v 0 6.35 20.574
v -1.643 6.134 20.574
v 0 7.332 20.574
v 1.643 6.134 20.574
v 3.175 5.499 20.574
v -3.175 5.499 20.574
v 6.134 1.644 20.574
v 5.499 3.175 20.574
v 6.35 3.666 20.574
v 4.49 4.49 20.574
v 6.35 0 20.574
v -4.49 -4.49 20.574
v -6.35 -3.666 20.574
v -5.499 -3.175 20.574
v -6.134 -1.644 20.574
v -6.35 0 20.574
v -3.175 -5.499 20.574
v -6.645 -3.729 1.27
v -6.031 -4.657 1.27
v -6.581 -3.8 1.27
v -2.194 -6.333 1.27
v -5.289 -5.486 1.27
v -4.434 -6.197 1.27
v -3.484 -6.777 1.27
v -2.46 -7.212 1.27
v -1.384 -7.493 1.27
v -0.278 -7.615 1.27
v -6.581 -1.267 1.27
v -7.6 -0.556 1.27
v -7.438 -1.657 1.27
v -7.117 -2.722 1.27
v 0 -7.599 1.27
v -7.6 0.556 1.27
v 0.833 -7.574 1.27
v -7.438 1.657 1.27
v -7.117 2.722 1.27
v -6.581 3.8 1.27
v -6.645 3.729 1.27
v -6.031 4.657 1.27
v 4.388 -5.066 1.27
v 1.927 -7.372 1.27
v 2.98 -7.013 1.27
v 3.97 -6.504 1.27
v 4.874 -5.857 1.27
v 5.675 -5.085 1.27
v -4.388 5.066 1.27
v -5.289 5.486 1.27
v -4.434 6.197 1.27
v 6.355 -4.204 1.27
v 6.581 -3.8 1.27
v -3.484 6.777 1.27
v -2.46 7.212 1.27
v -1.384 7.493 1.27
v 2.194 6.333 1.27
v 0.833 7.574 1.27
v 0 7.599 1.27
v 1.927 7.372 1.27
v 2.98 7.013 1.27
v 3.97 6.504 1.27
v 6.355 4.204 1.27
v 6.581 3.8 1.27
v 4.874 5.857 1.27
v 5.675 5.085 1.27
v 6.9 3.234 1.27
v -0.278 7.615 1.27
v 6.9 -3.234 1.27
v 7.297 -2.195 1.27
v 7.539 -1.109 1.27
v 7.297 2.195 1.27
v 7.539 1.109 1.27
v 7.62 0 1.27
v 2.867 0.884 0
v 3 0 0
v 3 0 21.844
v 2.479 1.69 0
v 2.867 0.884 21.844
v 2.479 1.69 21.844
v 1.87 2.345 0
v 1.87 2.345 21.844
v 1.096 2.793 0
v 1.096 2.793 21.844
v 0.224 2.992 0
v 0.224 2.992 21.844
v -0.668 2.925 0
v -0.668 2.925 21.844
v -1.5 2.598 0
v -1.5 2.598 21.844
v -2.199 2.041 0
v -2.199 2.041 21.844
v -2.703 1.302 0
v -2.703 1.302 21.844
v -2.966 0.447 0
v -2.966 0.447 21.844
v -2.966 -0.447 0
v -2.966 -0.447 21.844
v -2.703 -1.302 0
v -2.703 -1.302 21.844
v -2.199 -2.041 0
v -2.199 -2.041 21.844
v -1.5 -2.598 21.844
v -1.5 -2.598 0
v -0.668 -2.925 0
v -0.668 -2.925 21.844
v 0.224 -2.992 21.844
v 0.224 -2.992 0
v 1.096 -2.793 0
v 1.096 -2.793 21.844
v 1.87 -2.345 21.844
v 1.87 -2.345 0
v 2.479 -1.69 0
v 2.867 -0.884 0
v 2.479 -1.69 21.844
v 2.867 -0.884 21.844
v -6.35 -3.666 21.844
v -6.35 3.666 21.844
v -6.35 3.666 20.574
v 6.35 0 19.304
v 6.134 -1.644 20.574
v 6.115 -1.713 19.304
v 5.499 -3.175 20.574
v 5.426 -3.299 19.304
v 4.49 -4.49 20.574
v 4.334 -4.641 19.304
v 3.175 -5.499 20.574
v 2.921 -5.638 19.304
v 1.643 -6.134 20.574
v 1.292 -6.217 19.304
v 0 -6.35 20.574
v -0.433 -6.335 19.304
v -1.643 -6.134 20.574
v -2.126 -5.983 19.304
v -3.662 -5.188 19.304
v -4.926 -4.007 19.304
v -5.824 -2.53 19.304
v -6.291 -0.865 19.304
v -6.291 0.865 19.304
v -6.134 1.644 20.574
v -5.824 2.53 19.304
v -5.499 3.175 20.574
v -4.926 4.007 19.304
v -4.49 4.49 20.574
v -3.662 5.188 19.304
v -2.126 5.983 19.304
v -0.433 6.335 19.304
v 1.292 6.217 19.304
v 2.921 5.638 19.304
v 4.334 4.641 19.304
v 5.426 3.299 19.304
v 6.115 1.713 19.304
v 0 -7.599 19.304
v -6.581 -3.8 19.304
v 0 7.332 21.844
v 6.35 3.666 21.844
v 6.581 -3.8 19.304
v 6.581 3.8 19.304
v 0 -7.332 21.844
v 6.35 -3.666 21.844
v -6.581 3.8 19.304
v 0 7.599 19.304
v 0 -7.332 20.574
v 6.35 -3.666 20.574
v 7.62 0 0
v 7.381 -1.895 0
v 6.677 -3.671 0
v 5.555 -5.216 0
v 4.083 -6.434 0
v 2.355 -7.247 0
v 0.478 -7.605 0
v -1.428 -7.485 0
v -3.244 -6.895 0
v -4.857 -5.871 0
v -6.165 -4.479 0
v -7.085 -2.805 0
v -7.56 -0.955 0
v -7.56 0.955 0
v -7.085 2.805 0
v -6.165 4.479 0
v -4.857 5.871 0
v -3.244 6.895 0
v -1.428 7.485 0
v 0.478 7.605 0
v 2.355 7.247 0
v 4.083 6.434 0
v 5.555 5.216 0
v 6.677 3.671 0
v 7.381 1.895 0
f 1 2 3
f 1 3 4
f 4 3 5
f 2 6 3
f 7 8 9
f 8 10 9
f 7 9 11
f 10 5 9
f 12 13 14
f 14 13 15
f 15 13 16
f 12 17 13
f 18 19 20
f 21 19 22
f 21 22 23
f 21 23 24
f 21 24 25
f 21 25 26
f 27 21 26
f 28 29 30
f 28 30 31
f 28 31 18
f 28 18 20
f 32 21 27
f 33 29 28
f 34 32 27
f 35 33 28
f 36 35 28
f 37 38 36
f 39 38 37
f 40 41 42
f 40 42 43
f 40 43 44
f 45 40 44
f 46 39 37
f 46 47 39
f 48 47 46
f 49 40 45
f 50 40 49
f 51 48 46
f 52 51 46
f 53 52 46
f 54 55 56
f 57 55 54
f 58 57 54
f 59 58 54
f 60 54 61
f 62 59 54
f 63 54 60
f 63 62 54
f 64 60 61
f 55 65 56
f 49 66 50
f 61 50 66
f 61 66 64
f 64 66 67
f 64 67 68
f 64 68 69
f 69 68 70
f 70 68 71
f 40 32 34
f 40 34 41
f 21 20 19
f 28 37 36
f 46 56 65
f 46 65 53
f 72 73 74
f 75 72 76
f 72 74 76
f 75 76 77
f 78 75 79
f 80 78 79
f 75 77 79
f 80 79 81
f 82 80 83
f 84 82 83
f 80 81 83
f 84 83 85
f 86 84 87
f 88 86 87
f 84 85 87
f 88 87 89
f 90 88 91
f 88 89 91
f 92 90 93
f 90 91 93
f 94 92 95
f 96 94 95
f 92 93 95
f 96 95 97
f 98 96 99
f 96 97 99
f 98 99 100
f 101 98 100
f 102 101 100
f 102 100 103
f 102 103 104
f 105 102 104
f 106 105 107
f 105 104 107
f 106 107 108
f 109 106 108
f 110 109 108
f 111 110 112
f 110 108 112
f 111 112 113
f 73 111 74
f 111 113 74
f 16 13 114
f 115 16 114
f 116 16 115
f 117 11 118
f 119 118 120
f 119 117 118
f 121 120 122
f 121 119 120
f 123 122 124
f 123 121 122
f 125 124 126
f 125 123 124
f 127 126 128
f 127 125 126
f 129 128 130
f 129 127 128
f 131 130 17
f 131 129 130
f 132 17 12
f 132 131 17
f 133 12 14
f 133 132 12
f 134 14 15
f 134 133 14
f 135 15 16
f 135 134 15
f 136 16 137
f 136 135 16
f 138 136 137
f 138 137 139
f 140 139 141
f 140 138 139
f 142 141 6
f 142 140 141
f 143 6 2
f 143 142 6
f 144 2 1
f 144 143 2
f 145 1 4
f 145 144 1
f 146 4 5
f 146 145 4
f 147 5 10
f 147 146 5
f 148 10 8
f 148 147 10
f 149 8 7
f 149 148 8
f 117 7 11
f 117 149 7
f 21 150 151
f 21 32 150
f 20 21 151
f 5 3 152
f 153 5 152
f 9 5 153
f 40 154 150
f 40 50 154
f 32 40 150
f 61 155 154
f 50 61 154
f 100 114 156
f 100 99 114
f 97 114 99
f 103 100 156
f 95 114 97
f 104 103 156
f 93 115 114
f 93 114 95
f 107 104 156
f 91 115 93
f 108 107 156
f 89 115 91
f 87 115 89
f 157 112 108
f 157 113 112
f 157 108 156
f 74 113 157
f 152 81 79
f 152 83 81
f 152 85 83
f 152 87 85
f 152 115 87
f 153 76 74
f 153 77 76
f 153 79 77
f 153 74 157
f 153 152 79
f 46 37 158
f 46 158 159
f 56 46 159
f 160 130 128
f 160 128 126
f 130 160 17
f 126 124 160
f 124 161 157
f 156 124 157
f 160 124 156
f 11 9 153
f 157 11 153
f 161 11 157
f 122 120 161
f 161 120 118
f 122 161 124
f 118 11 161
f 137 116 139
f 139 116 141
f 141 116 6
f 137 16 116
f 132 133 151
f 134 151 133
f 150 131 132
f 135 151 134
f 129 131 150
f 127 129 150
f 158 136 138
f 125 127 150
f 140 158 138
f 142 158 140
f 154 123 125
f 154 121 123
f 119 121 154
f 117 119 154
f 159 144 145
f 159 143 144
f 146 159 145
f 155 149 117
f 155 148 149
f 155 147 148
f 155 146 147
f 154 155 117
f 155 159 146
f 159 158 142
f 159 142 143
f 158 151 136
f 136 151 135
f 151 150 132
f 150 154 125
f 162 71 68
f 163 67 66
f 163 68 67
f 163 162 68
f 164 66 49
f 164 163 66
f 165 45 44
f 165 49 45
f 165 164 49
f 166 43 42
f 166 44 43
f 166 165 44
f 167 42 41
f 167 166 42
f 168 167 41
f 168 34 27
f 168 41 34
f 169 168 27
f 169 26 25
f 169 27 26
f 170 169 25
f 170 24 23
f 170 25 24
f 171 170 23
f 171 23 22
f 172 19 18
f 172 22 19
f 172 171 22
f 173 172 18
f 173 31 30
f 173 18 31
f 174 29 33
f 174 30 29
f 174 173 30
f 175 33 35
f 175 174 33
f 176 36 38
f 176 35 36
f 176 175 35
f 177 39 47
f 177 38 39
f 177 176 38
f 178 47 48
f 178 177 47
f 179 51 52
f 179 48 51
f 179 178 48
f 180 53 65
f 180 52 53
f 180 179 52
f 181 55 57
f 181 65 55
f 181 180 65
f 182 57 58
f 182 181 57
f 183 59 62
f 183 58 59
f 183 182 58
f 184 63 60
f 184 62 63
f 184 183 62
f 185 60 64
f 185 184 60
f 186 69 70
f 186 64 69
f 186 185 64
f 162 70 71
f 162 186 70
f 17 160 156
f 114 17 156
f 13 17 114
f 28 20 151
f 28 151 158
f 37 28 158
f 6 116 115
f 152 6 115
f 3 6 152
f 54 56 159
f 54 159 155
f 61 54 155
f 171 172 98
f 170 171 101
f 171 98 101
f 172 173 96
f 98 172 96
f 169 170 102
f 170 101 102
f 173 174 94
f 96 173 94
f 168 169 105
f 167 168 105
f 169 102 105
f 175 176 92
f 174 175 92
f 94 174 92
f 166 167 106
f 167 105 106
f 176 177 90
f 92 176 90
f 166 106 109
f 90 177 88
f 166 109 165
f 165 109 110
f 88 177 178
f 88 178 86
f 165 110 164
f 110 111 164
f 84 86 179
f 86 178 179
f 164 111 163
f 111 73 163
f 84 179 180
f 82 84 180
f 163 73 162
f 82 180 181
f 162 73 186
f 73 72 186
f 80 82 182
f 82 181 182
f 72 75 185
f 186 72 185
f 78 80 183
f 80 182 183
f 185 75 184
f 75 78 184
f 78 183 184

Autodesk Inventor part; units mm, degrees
ref_plane "XY Plane" through (0, 0, 0) normal (0, 0, 1) x (1, 0, 0)
sketch "Sketch3" plane through (0, 0, 0) normal (0, 0, 1) x (1, 0, 0)
  circle A0 centre (0, 0) radius 7.62
  dimension "d3" = 15.24
extrude "Extrusion2" add sketch "Sketch3" along normal blind 1.27
sketch "Sketch4" plane through (0, 0, 1.27) normal (0, 0, 1) x (1, 0, 0)
  line L0 (0, 7.5994) -> (6.5813, 3.7997)
  line L1 (6.5813, 3.7997) -> (6.5813, -3.7997)
  line L2 (6.5813, -3.7997) -> (0, -7.5994)
  line L3 (0, -7.5994) -> (-6.5813, -3.7997)
  line L4 (-6.5813, -3.7997) -> (-6.5813, 3.7997)
  line L5 (-6.5813, 3.7997) -> (0, 7.5994)
  point P0 (0, 0)
  point P1 (0, 0)
extrude "Extrusion3" add sketch "Sketch4" along normal blind 18.034
sketch "Sketch5" plane through (0, 0, 19.304) normal (0, 0, 1) x (1, 0, 0)
  circle A0 centre (0, 0) radius 6.35
  dimension "d8" = 12.7
extrude "Extrusion4" add sketch "Sketch5" along normal blind 1.27
sketch "Sketch6" plane through (0, 0, 20.574) normal (0, 0, 1) x (1, 0, 0)
  circle A0 centre (0, 0) radius 6.35 projected
  line L0 (6.5813, 3.7997) -> (6.5813, -3.7997) projected
  line L1 (6.5813, -3.7997) -> (0, -7.5994) projected
  line L2 (0, -7.5994) -> (-6.5813, -3.7997) projected
  line L3 (-6.5813, -3.7997) -> (-6.5813, 3.7997) projected
  line L4 (-6.5813, 3.7997) -> (0, 7.5994) projected
  line L5 (0, 7.5994) -> (6.5813, 3.7997) projected
  circle A1 centre (0, 0) radius 7.62 projected
  line L6 (0, 7.5994) -> (6.5813, 3.7997) projected
  line L7 (6.35, 3.6662) -> (6.35, -3.6662)
  line L8 (6.35, -3.6662) -> (0, -7.3323)
  line L9 (0, -7.3323) -> (-6.35, -3.6662)
  line L10 (-6.35, -3.6662) -> (-6.35, 3.6662)
  line L11 (-6.35, 3.6662) -> (0, 7.3323)
  line L12 (0, 7.3323) -> (6.35, 3.6662)
  point P0 (3.175, 5.4993)
extrude "Extrusion5" add sketch "Sketch6" along normal blind 1.27 contours A0 | L7 L8 A0 | A0 L12 L7 | A0 L11 L12 | L8 L9 A0 | A0 L10 L11 | L9 L10 A0
sketch "Sketch7" plane through (0, 0, 21.844) normal (0, 0, 1) x (1, 0, 0)
  circle A0 centre (0, 0) radius 3
  dimension "d13" = 6
extrude "Extrusion6" cut sketch "Sketch7" against normal up to next
ref_plane "Work Plane1" through (0, 0, 0) normal (0, 1, 0) x (-1, 0, 0)
ref_plane "Work Plane2" through (0, 0, 0) normal (1, 0, 0) x (0, 1, 0)
properties part number "BaneBots-T40-6mm-Shaft-Adapter"
